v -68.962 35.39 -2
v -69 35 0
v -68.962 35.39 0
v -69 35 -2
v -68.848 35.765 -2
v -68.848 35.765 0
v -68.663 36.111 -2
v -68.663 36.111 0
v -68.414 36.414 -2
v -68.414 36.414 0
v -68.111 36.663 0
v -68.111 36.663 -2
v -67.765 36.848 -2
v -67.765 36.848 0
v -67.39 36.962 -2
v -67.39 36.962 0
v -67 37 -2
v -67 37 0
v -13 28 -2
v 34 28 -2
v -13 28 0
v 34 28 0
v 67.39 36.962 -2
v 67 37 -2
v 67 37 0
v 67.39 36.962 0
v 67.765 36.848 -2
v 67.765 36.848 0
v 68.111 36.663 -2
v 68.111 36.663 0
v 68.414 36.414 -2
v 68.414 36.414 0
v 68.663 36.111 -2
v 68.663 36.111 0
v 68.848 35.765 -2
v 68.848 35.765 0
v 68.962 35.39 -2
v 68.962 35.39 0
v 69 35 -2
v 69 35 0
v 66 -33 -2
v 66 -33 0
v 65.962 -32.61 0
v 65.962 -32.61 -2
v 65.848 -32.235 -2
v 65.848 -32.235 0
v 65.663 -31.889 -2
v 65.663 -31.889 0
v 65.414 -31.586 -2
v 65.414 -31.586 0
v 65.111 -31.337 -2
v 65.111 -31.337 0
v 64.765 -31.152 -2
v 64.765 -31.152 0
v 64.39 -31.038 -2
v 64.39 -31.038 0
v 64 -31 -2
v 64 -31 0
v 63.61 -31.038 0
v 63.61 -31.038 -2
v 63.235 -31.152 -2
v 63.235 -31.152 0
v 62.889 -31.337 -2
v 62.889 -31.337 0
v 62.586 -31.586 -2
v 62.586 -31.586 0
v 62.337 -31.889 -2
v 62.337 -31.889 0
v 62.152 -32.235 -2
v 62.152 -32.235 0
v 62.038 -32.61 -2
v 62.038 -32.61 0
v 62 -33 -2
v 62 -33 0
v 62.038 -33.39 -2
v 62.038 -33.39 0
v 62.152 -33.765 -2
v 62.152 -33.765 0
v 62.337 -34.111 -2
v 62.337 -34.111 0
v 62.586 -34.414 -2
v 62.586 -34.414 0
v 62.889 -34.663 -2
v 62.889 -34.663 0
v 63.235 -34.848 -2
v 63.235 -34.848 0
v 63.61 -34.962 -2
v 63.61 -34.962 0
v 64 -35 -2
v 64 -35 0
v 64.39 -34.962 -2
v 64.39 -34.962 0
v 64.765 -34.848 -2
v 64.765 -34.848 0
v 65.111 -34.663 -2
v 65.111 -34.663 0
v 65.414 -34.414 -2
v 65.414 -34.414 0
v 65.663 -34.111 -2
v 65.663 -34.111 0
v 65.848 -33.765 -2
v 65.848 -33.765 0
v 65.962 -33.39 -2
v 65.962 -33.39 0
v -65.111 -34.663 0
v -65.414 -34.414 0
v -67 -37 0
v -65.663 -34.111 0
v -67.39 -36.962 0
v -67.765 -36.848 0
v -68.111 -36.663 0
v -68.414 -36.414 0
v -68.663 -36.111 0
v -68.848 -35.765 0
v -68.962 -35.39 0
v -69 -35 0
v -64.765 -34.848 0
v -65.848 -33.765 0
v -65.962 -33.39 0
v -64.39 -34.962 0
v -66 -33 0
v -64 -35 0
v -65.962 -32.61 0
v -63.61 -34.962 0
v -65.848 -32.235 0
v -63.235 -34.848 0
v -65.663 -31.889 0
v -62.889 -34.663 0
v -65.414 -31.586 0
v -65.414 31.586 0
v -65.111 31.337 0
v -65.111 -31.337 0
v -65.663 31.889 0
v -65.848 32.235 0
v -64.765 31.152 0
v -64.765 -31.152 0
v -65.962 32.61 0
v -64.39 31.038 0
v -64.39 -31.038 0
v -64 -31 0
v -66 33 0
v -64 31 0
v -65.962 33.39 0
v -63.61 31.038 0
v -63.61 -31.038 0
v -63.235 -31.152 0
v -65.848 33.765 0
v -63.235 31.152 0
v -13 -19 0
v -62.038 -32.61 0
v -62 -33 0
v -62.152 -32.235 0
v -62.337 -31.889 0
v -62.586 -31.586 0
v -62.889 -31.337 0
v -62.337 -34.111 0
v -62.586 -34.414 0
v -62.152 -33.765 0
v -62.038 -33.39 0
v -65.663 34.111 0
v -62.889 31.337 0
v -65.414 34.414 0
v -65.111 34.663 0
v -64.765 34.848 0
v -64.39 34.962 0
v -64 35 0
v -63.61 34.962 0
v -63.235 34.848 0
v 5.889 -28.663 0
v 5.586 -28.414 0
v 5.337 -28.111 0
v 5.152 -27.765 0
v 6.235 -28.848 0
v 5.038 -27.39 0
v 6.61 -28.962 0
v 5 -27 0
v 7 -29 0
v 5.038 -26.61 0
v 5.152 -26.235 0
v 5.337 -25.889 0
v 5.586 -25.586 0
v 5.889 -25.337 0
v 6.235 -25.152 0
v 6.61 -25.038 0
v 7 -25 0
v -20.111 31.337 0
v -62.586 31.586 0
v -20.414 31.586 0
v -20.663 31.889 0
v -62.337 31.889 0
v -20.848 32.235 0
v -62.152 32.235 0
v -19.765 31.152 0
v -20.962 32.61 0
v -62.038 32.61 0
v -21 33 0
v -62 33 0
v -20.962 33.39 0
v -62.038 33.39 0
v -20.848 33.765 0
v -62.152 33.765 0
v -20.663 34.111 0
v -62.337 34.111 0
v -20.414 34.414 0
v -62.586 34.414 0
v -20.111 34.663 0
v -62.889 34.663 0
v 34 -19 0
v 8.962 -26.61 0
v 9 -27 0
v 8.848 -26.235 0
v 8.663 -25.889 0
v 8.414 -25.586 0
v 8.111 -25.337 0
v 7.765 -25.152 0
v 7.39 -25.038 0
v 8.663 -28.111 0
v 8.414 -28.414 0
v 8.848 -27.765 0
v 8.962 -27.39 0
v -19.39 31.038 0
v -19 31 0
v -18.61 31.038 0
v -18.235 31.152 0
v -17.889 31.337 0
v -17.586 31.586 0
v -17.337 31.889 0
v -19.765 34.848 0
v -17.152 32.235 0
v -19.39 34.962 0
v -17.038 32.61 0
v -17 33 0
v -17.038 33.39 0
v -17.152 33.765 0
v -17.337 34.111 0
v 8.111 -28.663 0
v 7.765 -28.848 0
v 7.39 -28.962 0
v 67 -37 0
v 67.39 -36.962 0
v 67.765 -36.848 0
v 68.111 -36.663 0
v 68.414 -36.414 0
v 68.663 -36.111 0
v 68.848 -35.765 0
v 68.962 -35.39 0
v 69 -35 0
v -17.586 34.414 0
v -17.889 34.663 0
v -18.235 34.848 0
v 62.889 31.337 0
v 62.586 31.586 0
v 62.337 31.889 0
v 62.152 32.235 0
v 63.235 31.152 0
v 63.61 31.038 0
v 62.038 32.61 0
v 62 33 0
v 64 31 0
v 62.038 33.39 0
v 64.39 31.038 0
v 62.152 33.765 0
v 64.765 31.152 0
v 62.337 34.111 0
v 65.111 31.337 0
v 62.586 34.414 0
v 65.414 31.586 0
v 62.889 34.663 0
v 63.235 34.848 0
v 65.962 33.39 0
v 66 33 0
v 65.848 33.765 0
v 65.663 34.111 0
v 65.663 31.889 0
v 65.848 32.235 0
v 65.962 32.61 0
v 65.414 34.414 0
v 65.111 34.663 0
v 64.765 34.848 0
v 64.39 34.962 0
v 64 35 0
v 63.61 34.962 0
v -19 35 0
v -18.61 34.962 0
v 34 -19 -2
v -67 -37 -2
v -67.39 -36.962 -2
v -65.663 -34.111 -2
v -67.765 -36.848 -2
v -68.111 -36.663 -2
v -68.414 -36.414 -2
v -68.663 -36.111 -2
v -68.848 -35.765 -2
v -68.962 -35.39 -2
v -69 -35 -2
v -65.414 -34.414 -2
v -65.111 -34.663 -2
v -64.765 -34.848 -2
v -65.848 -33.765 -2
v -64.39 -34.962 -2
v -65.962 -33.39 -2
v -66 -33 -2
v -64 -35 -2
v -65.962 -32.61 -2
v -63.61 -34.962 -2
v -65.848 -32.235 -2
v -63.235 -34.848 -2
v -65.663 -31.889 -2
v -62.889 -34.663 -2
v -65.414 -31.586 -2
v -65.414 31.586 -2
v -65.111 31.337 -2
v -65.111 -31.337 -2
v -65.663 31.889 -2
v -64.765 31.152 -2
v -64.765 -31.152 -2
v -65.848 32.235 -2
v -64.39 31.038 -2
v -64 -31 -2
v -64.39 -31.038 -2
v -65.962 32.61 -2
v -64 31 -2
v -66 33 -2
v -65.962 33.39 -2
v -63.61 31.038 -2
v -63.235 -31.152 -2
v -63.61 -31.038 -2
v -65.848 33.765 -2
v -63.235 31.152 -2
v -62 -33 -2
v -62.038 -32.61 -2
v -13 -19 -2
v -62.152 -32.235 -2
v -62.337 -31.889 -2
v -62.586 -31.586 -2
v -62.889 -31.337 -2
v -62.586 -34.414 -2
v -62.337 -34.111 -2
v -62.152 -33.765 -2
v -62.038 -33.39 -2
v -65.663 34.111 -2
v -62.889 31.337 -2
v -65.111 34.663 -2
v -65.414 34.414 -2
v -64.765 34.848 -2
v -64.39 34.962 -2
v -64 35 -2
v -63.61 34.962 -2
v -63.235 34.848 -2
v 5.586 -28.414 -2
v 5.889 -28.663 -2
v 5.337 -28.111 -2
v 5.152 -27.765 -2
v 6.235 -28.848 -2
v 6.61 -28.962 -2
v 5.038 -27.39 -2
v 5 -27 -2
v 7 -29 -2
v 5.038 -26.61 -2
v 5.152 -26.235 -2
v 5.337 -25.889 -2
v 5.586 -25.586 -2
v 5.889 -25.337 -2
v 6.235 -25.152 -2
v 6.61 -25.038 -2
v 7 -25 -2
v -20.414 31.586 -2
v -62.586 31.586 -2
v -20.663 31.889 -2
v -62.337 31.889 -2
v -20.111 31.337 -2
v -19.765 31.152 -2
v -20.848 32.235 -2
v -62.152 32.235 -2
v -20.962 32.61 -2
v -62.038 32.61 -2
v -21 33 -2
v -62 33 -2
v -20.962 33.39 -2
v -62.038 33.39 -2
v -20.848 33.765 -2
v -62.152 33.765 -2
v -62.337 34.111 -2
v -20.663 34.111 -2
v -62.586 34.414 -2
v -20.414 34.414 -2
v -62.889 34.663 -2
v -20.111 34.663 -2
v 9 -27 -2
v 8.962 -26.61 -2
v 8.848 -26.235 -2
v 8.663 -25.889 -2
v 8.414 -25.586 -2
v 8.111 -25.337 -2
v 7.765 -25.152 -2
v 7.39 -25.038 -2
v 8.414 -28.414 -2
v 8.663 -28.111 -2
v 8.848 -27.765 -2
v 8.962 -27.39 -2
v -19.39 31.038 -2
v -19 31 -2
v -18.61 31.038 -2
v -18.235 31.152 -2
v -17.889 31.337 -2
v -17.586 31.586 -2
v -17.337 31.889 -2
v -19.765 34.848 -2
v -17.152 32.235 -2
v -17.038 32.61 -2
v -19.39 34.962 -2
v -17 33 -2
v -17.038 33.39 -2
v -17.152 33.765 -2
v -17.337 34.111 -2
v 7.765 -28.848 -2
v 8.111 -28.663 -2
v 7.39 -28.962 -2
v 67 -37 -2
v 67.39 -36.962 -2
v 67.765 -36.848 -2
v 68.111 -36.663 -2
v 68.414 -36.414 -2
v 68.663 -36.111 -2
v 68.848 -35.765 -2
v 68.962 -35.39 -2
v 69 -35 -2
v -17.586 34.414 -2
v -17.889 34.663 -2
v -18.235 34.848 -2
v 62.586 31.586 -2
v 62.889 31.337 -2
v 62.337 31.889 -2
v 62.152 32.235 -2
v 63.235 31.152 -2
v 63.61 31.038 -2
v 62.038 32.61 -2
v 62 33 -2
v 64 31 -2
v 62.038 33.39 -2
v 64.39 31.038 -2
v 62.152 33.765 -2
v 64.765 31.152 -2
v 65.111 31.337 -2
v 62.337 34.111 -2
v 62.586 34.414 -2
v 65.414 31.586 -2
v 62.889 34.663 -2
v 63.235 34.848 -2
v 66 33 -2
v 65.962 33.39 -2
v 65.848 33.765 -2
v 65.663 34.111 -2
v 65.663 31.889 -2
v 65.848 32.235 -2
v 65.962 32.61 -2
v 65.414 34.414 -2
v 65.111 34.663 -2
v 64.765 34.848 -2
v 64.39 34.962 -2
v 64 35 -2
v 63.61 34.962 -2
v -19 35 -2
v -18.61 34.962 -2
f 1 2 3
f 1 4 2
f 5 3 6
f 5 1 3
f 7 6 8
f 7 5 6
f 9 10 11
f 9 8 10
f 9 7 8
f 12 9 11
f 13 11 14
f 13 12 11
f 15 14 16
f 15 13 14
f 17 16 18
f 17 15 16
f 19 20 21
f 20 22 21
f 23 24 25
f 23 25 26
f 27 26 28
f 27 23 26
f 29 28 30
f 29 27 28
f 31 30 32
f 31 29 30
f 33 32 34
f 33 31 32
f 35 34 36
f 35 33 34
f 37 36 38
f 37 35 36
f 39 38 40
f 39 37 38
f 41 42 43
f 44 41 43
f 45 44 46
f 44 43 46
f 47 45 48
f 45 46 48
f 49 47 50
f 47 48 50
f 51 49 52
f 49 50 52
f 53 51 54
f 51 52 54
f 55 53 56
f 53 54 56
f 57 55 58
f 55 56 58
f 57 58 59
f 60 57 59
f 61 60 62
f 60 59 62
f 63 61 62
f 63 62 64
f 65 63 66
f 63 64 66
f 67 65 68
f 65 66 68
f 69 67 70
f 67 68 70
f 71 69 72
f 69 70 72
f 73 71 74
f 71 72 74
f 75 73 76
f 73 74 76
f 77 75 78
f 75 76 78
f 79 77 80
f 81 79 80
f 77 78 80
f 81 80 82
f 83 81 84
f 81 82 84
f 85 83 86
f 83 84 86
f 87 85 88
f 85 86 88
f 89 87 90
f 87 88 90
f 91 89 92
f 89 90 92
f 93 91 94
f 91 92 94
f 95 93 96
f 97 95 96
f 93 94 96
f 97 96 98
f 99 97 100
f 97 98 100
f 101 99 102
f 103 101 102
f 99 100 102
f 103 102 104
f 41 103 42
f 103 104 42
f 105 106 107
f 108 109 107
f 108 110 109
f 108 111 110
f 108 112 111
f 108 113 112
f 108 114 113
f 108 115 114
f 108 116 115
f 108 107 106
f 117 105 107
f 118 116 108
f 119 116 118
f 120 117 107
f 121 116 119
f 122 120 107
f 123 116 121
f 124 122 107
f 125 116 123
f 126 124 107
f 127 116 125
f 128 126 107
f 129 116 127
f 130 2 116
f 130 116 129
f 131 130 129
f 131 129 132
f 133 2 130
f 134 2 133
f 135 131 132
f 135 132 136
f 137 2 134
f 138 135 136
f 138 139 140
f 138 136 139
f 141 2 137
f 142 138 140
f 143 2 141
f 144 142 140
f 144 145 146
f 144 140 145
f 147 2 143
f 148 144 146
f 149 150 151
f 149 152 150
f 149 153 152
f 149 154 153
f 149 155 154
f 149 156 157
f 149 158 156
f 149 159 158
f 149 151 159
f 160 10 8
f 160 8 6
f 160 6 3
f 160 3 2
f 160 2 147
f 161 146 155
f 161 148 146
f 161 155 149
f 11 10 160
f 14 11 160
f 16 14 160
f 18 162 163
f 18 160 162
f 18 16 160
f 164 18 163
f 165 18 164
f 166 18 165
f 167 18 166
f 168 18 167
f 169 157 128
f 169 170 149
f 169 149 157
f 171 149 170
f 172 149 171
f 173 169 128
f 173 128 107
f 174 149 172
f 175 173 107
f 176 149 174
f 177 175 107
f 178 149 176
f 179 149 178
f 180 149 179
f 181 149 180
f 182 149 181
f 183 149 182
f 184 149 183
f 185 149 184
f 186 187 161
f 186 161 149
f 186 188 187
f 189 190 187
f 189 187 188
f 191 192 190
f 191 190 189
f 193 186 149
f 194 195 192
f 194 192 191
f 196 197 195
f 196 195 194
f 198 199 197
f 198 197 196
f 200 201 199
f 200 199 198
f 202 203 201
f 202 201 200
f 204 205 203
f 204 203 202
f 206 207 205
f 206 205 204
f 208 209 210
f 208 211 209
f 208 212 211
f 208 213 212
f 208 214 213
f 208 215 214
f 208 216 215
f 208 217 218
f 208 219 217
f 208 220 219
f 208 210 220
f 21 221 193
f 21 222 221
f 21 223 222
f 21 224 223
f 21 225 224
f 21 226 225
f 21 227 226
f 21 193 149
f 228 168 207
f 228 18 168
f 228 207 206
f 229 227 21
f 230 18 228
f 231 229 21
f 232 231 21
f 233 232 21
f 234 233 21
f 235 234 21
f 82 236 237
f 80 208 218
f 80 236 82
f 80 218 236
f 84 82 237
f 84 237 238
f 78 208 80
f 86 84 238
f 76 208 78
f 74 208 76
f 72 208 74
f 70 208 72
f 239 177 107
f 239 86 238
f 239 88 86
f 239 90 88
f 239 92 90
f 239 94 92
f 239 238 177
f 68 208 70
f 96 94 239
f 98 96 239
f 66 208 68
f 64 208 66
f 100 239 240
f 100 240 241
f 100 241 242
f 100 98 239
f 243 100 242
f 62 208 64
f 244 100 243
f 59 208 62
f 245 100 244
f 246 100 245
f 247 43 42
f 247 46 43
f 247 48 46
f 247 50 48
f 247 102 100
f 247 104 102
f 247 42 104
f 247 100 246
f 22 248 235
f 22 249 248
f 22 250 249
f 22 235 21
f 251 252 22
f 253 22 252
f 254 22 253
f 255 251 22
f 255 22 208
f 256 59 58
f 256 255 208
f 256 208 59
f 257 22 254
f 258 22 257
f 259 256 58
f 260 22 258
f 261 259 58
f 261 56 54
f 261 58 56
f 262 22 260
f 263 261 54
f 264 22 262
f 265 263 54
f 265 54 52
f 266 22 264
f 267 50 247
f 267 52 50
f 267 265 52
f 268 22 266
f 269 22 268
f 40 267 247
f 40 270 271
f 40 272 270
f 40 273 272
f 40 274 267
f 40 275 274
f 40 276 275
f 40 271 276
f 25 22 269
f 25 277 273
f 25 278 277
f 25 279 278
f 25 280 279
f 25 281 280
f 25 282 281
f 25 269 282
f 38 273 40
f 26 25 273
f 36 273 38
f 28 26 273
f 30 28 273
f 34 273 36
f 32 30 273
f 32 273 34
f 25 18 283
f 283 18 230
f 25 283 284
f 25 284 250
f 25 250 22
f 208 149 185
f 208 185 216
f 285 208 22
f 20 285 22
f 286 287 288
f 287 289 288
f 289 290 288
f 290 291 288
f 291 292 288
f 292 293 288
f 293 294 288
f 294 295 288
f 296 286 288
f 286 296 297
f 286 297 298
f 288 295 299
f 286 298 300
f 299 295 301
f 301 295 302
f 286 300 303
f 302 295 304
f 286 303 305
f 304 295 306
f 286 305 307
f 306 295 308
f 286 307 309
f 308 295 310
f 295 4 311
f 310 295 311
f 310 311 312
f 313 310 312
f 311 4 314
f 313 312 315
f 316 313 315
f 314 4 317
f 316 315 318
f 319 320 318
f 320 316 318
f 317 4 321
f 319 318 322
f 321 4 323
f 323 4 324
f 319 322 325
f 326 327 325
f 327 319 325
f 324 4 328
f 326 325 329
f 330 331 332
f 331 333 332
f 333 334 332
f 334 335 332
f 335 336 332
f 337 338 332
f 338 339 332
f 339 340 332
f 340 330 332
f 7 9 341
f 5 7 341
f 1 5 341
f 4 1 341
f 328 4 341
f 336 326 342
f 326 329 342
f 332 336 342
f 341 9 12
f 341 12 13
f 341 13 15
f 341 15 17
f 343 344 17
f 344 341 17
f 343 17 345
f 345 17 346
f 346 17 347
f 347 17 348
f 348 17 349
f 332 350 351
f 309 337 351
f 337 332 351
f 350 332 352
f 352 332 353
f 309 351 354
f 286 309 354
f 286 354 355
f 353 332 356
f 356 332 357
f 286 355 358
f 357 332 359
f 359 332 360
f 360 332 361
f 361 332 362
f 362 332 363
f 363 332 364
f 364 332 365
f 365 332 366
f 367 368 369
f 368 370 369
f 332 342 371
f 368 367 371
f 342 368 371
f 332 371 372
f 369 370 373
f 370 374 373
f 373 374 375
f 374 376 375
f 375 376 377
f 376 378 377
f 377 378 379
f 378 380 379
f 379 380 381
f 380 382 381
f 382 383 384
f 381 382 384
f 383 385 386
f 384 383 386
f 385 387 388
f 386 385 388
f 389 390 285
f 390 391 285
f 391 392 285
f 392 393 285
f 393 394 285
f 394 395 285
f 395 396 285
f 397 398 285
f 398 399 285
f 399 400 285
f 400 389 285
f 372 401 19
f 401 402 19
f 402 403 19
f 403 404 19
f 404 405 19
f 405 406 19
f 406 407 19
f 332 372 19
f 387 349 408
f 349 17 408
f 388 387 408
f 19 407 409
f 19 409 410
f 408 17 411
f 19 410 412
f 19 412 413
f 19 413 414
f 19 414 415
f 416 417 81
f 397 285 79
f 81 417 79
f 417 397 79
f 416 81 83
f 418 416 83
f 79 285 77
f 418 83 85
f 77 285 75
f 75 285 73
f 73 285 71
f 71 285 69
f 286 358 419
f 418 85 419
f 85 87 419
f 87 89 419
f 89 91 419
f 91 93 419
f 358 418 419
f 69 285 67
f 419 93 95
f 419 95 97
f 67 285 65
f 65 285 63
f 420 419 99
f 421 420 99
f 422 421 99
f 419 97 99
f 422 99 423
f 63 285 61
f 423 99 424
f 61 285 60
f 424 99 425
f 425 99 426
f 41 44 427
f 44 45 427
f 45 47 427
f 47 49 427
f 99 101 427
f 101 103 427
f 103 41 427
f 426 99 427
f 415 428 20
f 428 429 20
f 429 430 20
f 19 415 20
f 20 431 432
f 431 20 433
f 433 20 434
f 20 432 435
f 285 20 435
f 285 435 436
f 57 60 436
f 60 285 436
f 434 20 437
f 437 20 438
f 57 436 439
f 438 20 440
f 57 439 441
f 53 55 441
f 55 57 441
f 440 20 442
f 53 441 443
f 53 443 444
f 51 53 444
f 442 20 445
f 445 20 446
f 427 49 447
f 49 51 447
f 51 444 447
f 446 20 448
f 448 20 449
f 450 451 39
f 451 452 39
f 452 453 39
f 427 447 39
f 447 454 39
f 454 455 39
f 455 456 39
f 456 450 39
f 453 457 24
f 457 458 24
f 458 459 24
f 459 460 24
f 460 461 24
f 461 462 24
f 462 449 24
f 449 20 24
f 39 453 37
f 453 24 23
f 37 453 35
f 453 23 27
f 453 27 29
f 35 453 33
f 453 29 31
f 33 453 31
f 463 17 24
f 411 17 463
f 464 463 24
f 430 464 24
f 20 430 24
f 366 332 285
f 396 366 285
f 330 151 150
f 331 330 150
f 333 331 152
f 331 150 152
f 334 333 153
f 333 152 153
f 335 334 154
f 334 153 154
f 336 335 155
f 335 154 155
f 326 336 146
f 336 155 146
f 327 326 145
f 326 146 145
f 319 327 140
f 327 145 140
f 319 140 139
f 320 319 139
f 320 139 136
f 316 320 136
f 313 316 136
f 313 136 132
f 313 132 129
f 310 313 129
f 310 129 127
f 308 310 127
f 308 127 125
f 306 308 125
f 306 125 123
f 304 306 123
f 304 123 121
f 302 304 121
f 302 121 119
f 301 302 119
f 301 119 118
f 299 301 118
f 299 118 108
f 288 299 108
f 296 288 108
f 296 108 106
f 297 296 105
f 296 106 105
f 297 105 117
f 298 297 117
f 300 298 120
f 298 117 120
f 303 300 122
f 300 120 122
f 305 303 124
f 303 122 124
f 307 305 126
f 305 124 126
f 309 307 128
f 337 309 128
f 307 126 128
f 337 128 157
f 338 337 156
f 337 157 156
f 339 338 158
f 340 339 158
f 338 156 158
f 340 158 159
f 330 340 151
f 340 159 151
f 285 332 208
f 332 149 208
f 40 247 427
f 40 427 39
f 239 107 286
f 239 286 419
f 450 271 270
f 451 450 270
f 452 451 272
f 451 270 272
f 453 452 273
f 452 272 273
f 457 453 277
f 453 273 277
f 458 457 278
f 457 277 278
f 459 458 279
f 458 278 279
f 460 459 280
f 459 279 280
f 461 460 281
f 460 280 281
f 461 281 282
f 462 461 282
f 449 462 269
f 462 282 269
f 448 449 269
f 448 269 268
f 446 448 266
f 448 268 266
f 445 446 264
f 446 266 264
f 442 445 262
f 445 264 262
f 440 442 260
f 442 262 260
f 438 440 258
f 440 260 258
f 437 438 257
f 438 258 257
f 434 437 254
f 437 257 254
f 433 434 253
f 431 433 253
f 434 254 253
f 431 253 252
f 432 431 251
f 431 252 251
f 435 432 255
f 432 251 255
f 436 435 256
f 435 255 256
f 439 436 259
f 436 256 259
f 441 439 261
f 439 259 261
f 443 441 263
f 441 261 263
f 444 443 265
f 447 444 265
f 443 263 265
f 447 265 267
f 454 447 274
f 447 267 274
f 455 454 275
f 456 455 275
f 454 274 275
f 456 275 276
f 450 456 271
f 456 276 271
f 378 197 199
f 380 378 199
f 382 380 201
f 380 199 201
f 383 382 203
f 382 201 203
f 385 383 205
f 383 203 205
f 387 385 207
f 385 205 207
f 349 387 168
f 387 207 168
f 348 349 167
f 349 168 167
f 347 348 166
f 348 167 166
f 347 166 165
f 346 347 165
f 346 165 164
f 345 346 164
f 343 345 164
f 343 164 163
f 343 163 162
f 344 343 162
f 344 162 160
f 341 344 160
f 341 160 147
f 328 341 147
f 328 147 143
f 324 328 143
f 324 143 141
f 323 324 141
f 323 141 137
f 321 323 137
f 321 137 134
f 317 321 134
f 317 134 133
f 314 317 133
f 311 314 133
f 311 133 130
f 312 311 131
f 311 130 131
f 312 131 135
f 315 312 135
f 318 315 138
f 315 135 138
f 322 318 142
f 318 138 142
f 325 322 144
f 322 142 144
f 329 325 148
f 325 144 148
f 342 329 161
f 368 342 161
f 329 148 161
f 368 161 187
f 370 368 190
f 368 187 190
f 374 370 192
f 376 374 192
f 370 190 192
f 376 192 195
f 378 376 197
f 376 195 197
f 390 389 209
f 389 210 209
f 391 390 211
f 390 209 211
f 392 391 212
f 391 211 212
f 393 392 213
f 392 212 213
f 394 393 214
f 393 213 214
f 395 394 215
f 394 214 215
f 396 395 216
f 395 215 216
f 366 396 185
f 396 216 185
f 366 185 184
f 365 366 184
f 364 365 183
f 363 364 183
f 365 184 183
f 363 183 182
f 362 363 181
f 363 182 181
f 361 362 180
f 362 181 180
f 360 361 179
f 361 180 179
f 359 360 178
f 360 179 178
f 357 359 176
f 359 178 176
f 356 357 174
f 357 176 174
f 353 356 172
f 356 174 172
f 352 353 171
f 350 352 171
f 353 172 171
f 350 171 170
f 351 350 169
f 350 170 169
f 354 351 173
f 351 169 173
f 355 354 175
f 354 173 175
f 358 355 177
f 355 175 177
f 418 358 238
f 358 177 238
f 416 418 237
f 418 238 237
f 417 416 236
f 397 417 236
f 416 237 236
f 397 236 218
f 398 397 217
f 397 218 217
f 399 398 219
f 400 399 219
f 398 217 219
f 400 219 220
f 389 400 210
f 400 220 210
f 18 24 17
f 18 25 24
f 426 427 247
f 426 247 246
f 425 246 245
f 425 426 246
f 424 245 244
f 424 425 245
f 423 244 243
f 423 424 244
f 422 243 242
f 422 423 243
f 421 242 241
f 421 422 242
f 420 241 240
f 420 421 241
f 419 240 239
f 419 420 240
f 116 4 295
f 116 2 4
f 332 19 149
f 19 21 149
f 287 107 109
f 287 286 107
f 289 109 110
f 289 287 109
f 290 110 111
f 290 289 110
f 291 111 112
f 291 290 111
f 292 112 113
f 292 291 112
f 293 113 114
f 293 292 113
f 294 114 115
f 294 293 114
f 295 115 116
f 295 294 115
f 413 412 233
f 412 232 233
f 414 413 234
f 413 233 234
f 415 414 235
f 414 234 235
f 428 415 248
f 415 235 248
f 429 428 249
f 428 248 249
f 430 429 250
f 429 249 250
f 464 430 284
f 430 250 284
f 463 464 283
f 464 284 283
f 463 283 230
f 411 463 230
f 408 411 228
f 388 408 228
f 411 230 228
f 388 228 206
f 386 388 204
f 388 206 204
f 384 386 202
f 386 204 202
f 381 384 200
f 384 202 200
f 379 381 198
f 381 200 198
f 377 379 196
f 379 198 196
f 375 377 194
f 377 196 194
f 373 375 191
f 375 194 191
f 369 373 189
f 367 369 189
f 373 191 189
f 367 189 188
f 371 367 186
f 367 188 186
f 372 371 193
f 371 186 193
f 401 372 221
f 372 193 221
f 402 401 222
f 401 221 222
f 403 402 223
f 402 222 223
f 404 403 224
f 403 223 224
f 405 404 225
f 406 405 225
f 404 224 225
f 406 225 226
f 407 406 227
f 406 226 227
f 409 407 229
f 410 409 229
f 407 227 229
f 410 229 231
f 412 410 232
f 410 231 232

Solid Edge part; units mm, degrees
sketch "Sketch1" plane through (0, 0, 0) normal (0, 0, 1) x (1, 0, 0)
  line L0 (-69, -37) -> (69, -37)
  line L1 (69, -37) -> (69, 37)
  line L2 (69, 37) -> (-69, 37)
  line L3 (-69, 37) -> (-69, -37)
  line L4 (-13, -19) -> (34, -19)
  line L5 (34, -19) -> (34, 28)
  line L6 (34, 28) -> (-13, 28)
  line L7 (-13, 28) -> (-13, -19)
  circle A0 centre (-64, 33) radius 2
  circle A1 centre (-64, -33) radius 2
  circle A2 centre (64, -33) radius 2
  circle A3 centre (7, -27) radius 2
  circle A4 centre (64, 33) radius 2
  circle A5 centre (-19, 33) radius 2
  dimension "D1" = 138
  dimension "D2" = 74
  dimension "D3" = 47
  dimension "D4" = 47
  dimension "D5" = 4
  dimension "D6" = 5
  dimension "D7" = 4
  dimension "D8" = 5
  dimension "D9" = 4
  dimension "D10" = 4
  dimension "D11" = 4
  dimension "D12" = 5
  dimension "D13" = 4
  dimension "D14" = 88
  dimension "D15" = 10
  dimension "D16" = 62
  dimension "D17" = 35
  dimension "D18" = 18
extrude "Protrusion1" add sketch "Sketch1" against normal blind 2
fillet "Congé_1" radius 2 4 edges at (-69, -37, -1) (-69, 37, -1) (69, 37, -1) (69, -37, -1)
